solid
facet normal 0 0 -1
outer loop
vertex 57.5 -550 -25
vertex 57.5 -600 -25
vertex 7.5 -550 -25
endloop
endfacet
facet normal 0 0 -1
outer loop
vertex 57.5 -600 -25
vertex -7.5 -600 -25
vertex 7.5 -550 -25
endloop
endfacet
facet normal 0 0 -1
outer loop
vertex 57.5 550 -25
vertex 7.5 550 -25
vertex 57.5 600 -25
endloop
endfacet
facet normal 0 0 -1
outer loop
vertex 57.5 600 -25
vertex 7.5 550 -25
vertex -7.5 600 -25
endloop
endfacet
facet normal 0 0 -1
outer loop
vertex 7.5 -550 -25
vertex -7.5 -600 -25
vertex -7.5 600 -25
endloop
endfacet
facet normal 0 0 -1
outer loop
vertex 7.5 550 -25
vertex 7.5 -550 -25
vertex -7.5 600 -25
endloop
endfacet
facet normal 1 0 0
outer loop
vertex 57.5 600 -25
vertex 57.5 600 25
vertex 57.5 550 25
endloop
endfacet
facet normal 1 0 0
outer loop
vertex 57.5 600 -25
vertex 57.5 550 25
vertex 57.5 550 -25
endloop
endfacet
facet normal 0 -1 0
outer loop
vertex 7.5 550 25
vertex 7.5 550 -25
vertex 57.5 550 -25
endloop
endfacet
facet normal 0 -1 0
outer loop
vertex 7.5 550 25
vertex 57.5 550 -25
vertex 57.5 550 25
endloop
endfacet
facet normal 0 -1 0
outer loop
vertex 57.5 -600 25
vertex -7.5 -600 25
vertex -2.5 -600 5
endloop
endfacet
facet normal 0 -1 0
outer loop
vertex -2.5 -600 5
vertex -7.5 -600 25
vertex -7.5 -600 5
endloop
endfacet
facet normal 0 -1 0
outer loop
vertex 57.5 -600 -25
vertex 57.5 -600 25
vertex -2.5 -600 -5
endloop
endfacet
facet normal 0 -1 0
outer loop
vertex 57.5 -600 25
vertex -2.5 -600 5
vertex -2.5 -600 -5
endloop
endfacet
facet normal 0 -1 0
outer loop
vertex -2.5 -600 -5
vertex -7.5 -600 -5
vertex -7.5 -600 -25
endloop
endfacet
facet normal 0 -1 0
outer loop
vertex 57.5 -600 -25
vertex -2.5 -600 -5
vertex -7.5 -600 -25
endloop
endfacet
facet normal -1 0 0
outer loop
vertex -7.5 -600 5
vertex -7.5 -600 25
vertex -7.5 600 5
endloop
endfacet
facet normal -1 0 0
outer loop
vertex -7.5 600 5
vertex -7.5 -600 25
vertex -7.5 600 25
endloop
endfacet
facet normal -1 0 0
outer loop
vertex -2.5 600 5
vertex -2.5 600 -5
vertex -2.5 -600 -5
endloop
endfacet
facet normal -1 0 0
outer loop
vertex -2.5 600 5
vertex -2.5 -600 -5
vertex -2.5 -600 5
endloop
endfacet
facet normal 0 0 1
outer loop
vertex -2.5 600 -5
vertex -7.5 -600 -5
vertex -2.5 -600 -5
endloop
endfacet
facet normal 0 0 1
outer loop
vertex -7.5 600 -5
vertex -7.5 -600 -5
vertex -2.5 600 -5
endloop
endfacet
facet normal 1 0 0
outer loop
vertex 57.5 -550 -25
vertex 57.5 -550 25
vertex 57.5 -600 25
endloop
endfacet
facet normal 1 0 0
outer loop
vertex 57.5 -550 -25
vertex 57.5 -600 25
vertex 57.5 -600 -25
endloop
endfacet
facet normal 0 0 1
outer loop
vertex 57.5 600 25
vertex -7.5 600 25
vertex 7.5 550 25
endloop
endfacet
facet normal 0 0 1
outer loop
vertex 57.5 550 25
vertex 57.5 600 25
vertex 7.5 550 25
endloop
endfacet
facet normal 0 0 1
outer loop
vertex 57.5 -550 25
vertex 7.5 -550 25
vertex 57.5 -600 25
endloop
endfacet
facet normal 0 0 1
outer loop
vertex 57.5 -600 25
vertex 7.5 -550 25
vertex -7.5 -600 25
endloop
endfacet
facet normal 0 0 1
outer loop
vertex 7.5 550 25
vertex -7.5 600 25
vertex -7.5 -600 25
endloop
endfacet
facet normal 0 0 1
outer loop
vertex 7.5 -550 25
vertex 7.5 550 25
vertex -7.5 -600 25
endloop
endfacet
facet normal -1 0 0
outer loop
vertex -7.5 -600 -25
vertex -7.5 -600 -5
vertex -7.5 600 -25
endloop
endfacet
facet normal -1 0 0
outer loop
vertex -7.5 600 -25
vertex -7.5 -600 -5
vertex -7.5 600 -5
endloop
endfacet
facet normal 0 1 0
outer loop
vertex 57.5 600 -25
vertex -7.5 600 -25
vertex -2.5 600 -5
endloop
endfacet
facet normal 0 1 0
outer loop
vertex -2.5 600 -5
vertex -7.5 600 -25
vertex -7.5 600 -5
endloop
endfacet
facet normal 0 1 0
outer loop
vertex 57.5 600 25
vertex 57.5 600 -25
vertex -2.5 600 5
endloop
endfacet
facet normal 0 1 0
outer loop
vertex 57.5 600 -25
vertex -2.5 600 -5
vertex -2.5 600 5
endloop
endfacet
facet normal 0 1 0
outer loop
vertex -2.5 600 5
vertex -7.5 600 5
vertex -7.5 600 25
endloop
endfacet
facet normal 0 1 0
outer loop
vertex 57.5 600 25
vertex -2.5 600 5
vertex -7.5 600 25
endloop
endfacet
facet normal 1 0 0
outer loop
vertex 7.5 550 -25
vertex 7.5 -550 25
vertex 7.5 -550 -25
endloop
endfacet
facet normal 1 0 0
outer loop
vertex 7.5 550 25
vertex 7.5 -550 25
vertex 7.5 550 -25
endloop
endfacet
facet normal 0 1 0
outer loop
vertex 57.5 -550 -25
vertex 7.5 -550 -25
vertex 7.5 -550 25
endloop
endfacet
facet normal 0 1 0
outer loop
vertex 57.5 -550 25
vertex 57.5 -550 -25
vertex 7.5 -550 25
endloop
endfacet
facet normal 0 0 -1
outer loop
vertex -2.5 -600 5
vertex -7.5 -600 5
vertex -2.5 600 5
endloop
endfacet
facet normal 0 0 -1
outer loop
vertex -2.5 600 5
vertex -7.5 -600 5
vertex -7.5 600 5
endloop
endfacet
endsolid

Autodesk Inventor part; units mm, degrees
ref_plane "YZ Plane" through (0, 0, 0) normal (1, 0, 0) x (0, 1, 0)
ref_plane "XZ Plane" through (0, 0, 0) normal (0, 1, 0) x (-1, 0, 0)
ref_plane "XY Plane" through (0, 0, 0) normal (0, 0, 1) x (1, 0, 0)
sketch "草图1" plane through (0, 0, 0) normal (1, 0, 0) x (0, 1, 0)
  line L0 (600, 25) -> (-600, 25)
  line L1 (-600, 25) -> (-600, -25)
  line L2 (-600, -25) -> (600, -25)
  line L3 (600, -25) -> (600, 25)
  line L4 (600, 25) -> (-600, -25) construction
  line L5 (-600, 25) -> (600, -25) construction
  point P0 (0, 0)
  dimension "d0" = 1200
  dimension "d1" = 50
extrude "拉伸1" add sketch "草图1" along normal mid plane 15
sketch "草图2" plane through (7.5, 0, 0) normal (1, 0, 0) x (0, 0, -1)
  line L0 (-25, 600) -> (-25, -600) projected
  line L1 (25, -600) -> (25, 600) projected
  line L2 (-25, 600) -> (25, 600)
  line L3 (25, 600) -> (25, 550)
  line L4 (25, 550) -> (-25, 550)
  line L5 (-25, 550) -> (-25, 600)
  line L6 (-25, -600) -> (25, -600)
  line L7 (25, -600) -> (25, -550)
  line L8 (25, -550) -> (-25, -550)
  line L9 (-25, -550) -> (-25, -600)
  point P0 (0, 0)
  point P1 (-25, -550)
  point P2 (-25, 550)
extrude "拉伸2" add sketch "草图2" along normal blind 50 contours L2 L1 L4 L0 | L8 L1 L6 L0
sketch "草图3" plane through (-7.5, 0, 0) normal (-1, 0, 0) x (0, 0, 1)
  line L0 (-25, 600) -> (-25, -600) projected
  line L1 (-25, -600) -> (-5, -600)
  line L2 (-25, -600) -> (25, -600) projected
  line L3 (25, -600) -> (5, -600)
  line L4 (-5, -600) -> (-5, 600)
  line L5 (25, 600) -> (-25, 600) projected
  line L6 (5, 400) -> (5, -600)
  line L7 (25, 550) -> (25, -550) projected
  line L8 (5, 400) -> (5, 600)
  line L9 (-25, 600) -> (25, 600) projected
  point P0 (0, 0)
  point P1 (5, 500)
extrude "拉伸3" cut sketch "草图3" against normal blind 5 contours L5 L8 L6 L2 L4
properties part number "竖直滑台"
